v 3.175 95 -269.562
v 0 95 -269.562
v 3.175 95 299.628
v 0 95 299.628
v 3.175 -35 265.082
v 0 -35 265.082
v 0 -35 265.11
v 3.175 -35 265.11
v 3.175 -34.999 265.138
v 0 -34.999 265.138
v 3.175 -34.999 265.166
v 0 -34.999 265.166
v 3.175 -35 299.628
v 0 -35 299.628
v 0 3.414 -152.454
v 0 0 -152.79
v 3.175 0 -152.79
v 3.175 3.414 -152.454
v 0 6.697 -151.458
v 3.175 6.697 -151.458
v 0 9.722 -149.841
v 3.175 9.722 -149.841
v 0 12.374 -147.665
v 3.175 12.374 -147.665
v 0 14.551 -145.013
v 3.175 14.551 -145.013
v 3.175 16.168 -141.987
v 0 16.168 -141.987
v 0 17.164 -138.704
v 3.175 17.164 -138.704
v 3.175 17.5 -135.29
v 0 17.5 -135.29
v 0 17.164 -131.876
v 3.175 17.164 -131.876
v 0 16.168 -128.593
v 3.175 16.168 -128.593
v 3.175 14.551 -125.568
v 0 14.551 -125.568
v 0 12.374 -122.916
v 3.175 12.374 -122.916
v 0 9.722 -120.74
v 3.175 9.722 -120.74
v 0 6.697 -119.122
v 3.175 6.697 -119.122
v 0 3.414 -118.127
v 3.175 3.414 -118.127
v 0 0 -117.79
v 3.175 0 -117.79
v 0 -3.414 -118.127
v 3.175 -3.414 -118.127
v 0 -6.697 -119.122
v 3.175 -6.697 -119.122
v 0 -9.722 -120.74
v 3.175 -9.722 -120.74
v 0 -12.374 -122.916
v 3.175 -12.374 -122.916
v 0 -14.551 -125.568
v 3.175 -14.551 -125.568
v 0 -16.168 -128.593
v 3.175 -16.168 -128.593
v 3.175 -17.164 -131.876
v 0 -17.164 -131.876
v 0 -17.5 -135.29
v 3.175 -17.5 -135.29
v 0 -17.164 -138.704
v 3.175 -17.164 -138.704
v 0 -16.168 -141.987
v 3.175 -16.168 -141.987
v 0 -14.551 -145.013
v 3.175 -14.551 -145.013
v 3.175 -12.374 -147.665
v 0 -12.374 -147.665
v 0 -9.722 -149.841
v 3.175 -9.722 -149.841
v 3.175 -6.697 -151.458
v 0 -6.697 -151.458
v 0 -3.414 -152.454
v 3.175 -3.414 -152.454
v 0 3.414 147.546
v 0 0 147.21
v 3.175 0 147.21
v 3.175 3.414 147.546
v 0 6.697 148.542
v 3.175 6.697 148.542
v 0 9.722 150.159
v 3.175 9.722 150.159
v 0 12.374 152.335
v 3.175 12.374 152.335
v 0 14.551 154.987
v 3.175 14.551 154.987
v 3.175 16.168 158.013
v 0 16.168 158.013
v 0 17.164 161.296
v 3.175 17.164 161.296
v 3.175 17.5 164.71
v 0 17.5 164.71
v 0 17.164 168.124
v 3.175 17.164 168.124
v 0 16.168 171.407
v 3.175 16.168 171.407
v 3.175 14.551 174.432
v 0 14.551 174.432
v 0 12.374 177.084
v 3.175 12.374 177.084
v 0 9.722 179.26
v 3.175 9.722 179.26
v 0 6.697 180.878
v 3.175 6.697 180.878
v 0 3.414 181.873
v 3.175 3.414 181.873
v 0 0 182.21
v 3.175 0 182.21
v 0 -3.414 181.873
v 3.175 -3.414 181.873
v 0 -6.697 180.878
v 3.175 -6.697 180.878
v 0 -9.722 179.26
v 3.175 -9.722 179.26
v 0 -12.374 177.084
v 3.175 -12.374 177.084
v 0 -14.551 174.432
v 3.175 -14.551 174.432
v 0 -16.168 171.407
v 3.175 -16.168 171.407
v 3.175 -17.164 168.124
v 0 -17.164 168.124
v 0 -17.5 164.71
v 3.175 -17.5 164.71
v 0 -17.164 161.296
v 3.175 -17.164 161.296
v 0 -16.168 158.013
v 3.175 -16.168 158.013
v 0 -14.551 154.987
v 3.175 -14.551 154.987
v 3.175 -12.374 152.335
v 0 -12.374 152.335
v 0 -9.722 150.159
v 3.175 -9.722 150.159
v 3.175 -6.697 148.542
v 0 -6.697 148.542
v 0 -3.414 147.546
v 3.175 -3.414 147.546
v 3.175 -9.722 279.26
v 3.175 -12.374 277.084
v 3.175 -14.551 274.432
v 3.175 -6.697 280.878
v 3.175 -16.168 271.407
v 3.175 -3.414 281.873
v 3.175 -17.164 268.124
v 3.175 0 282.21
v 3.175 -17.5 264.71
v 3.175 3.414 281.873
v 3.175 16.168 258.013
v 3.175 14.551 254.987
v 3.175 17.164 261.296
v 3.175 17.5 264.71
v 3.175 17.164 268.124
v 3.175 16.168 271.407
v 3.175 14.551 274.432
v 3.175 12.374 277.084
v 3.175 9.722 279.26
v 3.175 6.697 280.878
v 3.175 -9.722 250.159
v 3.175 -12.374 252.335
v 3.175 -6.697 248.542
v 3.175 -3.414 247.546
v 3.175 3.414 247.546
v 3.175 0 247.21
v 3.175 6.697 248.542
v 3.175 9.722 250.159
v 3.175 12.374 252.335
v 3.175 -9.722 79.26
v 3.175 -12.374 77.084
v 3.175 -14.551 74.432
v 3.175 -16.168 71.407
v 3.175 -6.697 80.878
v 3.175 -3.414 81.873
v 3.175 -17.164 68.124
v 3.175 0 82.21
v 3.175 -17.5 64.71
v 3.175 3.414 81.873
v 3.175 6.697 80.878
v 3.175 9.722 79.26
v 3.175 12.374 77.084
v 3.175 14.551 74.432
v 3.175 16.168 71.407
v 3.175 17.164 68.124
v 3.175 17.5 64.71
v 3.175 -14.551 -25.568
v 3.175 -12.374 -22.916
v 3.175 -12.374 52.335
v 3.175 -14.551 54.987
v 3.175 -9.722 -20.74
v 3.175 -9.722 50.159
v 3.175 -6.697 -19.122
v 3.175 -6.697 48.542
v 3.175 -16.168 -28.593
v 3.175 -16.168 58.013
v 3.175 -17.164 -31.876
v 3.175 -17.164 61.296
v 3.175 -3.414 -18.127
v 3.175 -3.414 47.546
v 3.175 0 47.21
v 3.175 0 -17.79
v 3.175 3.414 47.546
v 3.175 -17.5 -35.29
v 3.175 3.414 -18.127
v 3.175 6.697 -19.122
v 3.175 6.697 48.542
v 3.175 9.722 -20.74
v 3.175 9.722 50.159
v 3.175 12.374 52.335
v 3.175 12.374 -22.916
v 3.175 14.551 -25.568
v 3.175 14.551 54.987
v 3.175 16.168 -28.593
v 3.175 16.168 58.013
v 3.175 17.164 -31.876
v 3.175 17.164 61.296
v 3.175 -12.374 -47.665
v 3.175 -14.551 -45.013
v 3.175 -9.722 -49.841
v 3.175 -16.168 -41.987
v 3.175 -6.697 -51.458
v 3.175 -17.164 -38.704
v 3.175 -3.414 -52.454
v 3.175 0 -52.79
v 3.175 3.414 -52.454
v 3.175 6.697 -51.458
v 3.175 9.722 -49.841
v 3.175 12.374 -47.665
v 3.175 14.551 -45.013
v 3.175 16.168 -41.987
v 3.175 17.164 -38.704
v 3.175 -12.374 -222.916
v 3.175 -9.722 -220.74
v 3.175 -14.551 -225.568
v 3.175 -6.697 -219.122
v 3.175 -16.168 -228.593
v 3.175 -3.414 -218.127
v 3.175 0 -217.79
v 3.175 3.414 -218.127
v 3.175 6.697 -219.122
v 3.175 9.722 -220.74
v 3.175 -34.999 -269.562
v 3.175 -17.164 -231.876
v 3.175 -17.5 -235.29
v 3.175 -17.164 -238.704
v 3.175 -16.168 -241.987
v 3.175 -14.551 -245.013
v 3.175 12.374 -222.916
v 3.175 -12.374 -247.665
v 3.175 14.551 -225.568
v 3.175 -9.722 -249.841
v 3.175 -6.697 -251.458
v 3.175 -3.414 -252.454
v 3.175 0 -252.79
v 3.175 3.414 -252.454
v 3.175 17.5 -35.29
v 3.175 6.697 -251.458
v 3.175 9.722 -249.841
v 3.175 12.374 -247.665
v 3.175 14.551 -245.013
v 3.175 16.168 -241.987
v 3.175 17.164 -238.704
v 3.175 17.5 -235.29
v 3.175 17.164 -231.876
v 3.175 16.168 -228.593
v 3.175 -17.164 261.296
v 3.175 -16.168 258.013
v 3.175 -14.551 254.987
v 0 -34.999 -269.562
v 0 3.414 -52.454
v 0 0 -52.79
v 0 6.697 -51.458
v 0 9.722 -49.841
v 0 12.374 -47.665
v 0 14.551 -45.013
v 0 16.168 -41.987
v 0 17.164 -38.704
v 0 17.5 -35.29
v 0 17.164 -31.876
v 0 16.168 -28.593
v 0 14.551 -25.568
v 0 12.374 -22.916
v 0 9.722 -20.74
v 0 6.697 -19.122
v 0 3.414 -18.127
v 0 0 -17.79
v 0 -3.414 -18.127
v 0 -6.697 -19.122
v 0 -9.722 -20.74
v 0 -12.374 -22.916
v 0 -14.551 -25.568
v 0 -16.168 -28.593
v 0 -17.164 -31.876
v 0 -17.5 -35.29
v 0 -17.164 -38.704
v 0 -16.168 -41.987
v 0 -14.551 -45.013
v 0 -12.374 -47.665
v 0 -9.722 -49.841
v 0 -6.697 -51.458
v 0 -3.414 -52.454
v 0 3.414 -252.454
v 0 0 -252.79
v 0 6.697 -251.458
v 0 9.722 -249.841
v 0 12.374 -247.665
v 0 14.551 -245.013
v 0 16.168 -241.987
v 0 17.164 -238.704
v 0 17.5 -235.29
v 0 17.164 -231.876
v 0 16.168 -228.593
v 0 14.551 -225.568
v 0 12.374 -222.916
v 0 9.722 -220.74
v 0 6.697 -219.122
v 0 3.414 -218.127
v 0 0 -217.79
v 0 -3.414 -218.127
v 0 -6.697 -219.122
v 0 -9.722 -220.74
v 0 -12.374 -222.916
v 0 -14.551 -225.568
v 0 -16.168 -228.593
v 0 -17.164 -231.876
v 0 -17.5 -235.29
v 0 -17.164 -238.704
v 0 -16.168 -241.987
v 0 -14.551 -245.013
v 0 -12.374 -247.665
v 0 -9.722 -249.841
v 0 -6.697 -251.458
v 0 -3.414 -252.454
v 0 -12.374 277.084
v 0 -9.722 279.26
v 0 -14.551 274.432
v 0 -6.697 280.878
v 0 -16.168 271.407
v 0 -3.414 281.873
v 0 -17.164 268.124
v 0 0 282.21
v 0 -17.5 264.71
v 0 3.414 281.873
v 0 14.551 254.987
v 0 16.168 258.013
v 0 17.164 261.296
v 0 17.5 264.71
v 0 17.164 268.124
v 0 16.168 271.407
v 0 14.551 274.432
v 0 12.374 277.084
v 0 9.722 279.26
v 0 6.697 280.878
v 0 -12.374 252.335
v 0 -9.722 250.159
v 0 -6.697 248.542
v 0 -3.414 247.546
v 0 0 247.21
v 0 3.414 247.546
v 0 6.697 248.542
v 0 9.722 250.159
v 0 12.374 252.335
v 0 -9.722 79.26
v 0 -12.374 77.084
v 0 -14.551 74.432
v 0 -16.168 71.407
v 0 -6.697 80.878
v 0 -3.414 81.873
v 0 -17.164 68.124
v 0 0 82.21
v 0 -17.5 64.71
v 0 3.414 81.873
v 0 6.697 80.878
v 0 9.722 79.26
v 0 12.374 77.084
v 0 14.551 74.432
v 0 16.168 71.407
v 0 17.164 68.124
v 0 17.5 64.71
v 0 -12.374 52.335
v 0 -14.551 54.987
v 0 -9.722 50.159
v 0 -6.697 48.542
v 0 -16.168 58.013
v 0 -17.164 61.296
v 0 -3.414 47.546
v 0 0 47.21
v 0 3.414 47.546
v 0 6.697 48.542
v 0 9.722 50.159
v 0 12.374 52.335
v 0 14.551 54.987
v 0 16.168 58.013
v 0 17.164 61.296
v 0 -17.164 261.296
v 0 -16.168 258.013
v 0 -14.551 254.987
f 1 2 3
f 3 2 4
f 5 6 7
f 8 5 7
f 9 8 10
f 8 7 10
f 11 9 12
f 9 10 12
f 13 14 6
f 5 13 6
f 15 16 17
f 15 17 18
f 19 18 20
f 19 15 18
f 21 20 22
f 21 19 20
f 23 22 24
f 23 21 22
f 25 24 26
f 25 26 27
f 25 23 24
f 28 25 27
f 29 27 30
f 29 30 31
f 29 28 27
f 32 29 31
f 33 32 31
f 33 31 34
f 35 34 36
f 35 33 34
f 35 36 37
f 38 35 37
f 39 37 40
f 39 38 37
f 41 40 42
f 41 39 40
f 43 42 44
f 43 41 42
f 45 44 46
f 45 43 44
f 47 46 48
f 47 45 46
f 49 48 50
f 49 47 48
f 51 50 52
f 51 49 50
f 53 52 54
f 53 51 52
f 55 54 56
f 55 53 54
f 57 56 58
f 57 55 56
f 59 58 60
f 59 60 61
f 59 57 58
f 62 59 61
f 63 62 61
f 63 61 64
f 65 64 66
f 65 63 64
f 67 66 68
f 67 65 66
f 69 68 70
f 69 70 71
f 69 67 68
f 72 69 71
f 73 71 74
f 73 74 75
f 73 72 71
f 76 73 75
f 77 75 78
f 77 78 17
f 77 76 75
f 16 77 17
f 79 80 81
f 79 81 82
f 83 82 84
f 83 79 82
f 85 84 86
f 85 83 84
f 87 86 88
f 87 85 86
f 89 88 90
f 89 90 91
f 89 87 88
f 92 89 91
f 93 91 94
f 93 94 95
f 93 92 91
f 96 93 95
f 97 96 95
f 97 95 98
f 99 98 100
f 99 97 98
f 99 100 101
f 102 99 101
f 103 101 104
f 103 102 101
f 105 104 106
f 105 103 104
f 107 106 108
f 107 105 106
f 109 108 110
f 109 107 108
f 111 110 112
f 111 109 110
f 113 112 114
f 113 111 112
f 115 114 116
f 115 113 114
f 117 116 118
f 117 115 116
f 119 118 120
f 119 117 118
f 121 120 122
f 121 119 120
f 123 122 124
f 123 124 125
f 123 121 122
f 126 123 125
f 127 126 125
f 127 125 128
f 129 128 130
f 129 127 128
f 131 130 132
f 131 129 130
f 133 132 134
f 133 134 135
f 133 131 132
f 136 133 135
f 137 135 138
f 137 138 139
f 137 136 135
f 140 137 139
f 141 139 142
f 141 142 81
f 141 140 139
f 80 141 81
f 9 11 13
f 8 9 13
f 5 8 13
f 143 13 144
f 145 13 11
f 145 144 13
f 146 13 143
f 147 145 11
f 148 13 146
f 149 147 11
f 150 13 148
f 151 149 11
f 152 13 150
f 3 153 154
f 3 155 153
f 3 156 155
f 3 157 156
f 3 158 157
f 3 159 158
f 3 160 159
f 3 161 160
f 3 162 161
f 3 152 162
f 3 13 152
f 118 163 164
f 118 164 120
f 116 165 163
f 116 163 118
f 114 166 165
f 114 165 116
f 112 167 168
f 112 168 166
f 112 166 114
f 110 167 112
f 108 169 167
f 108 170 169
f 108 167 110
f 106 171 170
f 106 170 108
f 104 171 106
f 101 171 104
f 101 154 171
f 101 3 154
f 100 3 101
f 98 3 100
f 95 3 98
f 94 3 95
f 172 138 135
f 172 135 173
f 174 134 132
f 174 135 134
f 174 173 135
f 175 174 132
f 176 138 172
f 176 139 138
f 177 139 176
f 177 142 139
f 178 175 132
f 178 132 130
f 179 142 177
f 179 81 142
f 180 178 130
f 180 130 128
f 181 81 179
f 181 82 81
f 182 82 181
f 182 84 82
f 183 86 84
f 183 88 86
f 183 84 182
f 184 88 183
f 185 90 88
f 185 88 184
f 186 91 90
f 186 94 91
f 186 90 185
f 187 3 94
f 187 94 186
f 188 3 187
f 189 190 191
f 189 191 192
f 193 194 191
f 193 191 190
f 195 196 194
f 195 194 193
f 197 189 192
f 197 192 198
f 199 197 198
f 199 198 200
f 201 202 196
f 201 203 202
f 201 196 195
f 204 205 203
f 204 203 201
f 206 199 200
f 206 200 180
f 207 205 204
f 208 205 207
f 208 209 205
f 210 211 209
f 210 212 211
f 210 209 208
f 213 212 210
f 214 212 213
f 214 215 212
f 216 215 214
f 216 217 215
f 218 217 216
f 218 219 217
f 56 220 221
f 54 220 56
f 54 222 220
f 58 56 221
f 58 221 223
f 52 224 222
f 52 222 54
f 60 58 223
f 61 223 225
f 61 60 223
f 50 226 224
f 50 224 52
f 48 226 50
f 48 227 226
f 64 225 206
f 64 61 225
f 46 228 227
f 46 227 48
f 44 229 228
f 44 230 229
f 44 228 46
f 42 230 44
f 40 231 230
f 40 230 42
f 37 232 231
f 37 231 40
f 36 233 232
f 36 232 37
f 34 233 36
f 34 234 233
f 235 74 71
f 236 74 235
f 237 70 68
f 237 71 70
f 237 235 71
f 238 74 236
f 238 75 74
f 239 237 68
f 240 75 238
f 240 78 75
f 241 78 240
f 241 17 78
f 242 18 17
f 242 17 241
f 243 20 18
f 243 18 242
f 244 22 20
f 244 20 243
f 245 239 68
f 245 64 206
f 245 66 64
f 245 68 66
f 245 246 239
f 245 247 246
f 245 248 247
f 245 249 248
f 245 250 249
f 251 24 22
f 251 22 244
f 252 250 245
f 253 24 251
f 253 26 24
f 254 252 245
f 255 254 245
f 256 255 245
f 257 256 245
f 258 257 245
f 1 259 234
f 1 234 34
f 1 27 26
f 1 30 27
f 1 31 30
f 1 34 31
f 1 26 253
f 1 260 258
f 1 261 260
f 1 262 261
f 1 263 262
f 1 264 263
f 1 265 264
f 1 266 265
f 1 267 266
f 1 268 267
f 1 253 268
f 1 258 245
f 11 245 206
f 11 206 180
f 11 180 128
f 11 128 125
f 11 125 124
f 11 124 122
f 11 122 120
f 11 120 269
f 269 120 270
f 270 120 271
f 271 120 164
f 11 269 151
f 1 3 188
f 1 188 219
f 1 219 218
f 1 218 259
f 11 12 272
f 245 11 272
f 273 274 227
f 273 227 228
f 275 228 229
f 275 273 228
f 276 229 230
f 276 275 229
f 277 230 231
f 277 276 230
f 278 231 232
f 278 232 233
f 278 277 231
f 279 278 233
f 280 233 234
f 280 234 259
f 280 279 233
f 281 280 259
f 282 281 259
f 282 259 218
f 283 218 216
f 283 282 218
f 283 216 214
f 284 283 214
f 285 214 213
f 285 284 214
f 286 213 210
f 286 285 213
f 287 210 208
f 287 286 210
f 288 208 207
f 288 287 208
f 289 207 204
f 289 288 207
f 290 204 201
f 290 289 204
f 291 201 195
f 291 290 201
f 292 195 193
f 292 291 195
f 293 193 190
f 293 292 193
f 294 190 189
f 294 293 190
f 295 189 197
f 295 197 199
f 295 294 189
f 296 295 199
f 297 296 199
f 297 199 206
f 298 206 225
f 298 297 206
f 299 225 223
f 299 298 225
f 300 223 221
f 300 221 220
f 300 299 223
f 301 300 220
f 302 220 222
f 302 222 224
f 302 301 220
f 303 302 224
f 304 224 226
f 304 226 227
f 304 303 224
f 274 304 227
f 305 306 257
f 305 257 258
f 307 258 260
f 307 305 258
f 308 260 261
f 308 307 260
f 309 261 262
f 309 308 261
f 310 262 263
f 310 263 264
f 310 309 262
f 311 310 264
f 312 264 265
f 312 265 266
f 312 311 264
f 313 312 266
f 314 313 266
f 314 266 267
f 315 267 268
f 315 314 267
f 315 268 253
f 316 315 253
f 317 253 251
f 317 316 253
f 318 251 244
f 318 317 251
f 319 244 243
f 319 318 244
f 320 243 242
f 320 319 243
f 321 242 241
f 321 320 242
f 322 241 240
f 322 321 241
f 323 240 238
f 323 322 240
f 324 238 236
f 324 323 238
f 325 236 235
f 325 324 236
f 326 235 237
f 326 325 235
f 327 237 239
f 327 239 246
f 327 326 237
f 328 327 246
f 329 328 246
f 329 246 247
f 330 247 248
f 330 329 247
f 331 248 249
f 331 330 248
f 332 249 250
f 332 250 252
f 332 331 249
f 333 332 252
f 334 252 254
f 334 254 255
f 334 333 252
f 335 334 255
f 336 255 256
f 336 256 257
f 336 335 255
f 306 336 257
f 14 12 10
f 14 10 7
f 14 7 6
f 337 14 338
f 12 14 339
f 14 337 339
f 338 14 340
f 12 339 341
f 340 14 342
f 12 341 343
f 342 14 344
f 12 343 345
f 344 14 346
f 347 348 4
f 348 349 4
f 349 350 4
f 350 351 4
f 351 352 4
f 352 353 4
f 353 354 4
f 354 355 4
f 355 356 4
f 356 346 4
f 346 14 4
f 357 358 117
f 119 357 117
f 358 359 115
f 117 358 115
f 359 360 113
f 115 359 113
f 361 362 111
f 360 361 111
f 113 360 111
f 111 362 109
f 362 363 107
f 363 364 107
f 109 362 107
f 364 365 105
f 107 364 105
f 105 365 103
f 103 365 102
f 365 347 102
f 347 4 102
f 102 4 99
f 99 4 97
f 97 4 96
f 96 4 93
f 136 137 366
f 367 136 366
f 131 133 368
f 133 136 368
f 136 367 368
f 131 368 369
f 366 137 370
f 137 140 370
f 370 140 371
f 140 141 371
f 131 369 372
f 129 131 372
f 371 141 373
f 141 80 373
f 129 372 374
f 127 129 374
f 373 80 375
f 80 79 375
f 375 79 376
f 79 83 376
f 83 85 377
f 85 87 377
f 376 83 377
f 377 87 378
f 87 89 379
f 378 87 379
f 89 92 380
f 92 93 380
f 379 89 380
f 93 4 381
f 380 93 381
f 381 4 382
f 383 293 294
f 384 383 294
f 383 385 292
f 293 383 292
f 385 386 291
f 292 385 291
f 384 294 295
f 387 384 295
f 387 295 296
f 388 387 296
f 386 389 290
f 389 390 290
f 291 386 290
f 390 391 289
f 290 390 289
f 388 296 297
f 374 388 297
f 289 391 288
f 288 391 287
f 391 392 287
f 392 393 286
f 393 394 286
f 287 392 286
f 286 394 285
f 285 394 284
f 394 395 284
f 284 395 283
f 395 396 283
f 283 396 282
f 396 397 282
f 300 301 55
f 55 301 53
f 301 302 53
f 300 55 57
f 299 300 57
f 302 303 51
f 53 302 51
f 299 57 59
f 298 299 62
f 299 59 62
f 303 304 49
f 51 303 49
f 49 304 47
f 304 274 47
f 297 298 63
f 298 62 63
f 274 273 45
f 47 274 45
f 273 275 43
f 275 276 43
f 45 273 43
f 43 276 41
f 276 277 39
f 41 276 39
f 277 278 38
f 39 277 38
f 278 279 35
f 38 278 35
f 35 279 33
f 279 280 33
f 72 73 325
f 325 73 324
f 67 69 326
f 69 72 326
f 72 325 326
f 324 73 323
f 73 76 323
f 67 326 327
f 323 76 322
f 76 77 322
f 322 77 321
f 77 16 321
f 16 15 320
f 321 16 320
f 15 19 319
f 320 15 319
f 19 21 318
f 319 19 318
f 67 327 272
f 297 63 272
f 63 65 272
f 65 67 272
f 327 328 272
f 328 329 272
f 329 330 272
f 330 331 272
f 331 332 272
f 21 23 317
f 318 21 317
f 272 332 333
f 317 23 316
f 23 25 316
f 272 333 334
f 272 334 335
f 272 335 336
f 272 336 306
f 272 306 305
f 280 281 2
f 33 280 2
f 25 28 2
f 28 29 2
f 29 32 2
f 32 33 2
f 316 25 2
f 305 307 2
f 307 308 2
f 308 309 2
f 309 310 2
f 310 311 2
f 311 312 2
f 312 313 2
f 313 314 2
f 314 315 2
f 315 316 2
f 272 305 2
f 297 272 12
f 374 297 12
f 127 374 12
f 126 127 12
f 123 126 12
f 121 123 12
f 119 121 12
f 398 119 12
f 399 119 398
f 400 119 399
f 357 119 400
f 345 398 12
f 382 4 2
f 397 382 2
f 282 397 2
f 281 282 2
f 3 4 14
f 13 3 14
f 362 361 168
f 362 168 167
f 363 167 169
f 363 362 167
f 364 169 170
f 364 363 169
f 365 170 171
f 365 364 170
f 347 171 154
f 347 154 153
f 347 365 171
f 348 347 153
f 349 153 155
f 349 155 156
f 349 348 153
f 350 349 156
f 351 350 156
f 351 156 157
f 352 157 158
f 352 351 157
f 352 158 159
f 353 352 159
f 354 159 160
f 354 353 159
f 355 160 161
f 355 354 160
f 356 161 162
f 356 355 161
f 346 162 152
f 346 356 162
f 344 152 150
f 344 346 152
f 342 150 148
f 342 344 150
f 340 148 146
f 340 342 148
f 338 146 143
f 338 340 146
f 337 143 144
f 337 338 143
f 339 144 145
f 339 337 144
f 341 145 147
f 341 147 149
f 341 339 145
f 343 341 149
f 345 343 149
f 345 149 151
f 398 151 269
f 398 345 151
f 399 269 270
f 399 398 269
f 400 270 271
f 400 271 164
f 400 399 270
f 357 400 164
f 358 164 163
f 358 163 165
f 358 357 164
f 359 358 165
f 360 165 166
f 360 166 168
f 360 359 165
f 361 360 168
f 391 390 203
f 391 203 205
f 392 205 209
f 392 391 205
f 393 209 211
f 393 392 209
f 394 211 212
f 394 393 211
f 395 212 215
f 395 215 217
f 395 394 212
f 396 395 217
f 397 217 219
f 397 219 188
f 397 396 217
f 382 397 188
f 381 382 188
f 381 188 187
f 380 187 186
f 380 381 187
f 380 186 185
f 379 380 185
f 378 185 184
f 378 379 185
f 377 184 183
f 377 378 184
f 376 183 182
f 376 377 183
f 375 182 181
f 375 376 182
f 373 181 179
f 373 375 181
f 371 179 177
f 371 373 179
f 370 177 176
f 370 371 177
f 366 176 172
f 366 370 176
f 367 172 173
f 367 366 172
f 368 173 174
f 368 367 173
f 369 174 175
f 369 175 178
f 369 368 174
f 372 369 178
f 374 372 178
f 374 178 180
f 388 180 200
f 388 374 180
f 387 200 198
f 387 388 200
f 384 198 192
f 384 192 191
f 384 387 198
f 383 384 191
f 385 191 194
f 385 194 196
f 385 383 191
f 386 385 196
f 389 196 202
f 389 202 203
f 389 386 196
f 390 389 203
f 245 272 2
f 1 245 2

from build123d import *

# Parameters (mm, degrees)
SKETCH1_R           = 17.5
BOSS_EXTRUDE1_DEPTH = 3.175


with BuildPart() as part:
    # Sketch1 → Boss-Extrude1 (new body)
    with BuildSketch(Plane(origin=(0, 0, 0), x_dir=(0, 0, -1), z_dir=(1, 0, 0))):
        with BuildLine():
            Line((-299.628459553, 0), (-299.628459553, -35))
            Line((-299.628459553, -35), (-265.081967213, -35))
            ThreePointArc((-265.081967213, -35), (-265.124051275, -34.999527037), (-265.166134738, -34.999003472))
            Line((-265.166134738, -34.999003472), (269.561502977, -34.999003472))
            Line((269.561502977, -34.999003472), (269.561502977, 7.5))
            Line((269.561502977, 7.5), (269.561502977, 95))
            Line((269.561502977, 95), (-299.628459553, 95))
            Line((-299.628459553, 95), (-299.628459553, 0))
        make_face()
        with Locations((-264.709663373, 0)):
            Circle(SKETCH1_R, mode=Mode.SUBTRACT)
        with Locations((-164.709663373, 0)):
            Circle(SKETCH1_R, mode=Mode.SUBTRACT)
        with Locations((-64.709663373, 0)):
            Circle(SKETCH1_R, mode=Mode.SUBTRACT)
        with Locations((35.290336627, 0)):
            Circle(SKETCH1_R, mode=Mode.SUBTRACT)
        with Locations((135.290336627, 0)):
            Circle(SKETCH1_R, mode=Mode.SUBTRACT)
        with Locations((235.290336627, 0)):
            Circle(SKETCH1_R, mode=Mode.SUBTRACT)
    extrude(amount=BOSS_EXTRUDE1_DEPTH)


solid = part.part
